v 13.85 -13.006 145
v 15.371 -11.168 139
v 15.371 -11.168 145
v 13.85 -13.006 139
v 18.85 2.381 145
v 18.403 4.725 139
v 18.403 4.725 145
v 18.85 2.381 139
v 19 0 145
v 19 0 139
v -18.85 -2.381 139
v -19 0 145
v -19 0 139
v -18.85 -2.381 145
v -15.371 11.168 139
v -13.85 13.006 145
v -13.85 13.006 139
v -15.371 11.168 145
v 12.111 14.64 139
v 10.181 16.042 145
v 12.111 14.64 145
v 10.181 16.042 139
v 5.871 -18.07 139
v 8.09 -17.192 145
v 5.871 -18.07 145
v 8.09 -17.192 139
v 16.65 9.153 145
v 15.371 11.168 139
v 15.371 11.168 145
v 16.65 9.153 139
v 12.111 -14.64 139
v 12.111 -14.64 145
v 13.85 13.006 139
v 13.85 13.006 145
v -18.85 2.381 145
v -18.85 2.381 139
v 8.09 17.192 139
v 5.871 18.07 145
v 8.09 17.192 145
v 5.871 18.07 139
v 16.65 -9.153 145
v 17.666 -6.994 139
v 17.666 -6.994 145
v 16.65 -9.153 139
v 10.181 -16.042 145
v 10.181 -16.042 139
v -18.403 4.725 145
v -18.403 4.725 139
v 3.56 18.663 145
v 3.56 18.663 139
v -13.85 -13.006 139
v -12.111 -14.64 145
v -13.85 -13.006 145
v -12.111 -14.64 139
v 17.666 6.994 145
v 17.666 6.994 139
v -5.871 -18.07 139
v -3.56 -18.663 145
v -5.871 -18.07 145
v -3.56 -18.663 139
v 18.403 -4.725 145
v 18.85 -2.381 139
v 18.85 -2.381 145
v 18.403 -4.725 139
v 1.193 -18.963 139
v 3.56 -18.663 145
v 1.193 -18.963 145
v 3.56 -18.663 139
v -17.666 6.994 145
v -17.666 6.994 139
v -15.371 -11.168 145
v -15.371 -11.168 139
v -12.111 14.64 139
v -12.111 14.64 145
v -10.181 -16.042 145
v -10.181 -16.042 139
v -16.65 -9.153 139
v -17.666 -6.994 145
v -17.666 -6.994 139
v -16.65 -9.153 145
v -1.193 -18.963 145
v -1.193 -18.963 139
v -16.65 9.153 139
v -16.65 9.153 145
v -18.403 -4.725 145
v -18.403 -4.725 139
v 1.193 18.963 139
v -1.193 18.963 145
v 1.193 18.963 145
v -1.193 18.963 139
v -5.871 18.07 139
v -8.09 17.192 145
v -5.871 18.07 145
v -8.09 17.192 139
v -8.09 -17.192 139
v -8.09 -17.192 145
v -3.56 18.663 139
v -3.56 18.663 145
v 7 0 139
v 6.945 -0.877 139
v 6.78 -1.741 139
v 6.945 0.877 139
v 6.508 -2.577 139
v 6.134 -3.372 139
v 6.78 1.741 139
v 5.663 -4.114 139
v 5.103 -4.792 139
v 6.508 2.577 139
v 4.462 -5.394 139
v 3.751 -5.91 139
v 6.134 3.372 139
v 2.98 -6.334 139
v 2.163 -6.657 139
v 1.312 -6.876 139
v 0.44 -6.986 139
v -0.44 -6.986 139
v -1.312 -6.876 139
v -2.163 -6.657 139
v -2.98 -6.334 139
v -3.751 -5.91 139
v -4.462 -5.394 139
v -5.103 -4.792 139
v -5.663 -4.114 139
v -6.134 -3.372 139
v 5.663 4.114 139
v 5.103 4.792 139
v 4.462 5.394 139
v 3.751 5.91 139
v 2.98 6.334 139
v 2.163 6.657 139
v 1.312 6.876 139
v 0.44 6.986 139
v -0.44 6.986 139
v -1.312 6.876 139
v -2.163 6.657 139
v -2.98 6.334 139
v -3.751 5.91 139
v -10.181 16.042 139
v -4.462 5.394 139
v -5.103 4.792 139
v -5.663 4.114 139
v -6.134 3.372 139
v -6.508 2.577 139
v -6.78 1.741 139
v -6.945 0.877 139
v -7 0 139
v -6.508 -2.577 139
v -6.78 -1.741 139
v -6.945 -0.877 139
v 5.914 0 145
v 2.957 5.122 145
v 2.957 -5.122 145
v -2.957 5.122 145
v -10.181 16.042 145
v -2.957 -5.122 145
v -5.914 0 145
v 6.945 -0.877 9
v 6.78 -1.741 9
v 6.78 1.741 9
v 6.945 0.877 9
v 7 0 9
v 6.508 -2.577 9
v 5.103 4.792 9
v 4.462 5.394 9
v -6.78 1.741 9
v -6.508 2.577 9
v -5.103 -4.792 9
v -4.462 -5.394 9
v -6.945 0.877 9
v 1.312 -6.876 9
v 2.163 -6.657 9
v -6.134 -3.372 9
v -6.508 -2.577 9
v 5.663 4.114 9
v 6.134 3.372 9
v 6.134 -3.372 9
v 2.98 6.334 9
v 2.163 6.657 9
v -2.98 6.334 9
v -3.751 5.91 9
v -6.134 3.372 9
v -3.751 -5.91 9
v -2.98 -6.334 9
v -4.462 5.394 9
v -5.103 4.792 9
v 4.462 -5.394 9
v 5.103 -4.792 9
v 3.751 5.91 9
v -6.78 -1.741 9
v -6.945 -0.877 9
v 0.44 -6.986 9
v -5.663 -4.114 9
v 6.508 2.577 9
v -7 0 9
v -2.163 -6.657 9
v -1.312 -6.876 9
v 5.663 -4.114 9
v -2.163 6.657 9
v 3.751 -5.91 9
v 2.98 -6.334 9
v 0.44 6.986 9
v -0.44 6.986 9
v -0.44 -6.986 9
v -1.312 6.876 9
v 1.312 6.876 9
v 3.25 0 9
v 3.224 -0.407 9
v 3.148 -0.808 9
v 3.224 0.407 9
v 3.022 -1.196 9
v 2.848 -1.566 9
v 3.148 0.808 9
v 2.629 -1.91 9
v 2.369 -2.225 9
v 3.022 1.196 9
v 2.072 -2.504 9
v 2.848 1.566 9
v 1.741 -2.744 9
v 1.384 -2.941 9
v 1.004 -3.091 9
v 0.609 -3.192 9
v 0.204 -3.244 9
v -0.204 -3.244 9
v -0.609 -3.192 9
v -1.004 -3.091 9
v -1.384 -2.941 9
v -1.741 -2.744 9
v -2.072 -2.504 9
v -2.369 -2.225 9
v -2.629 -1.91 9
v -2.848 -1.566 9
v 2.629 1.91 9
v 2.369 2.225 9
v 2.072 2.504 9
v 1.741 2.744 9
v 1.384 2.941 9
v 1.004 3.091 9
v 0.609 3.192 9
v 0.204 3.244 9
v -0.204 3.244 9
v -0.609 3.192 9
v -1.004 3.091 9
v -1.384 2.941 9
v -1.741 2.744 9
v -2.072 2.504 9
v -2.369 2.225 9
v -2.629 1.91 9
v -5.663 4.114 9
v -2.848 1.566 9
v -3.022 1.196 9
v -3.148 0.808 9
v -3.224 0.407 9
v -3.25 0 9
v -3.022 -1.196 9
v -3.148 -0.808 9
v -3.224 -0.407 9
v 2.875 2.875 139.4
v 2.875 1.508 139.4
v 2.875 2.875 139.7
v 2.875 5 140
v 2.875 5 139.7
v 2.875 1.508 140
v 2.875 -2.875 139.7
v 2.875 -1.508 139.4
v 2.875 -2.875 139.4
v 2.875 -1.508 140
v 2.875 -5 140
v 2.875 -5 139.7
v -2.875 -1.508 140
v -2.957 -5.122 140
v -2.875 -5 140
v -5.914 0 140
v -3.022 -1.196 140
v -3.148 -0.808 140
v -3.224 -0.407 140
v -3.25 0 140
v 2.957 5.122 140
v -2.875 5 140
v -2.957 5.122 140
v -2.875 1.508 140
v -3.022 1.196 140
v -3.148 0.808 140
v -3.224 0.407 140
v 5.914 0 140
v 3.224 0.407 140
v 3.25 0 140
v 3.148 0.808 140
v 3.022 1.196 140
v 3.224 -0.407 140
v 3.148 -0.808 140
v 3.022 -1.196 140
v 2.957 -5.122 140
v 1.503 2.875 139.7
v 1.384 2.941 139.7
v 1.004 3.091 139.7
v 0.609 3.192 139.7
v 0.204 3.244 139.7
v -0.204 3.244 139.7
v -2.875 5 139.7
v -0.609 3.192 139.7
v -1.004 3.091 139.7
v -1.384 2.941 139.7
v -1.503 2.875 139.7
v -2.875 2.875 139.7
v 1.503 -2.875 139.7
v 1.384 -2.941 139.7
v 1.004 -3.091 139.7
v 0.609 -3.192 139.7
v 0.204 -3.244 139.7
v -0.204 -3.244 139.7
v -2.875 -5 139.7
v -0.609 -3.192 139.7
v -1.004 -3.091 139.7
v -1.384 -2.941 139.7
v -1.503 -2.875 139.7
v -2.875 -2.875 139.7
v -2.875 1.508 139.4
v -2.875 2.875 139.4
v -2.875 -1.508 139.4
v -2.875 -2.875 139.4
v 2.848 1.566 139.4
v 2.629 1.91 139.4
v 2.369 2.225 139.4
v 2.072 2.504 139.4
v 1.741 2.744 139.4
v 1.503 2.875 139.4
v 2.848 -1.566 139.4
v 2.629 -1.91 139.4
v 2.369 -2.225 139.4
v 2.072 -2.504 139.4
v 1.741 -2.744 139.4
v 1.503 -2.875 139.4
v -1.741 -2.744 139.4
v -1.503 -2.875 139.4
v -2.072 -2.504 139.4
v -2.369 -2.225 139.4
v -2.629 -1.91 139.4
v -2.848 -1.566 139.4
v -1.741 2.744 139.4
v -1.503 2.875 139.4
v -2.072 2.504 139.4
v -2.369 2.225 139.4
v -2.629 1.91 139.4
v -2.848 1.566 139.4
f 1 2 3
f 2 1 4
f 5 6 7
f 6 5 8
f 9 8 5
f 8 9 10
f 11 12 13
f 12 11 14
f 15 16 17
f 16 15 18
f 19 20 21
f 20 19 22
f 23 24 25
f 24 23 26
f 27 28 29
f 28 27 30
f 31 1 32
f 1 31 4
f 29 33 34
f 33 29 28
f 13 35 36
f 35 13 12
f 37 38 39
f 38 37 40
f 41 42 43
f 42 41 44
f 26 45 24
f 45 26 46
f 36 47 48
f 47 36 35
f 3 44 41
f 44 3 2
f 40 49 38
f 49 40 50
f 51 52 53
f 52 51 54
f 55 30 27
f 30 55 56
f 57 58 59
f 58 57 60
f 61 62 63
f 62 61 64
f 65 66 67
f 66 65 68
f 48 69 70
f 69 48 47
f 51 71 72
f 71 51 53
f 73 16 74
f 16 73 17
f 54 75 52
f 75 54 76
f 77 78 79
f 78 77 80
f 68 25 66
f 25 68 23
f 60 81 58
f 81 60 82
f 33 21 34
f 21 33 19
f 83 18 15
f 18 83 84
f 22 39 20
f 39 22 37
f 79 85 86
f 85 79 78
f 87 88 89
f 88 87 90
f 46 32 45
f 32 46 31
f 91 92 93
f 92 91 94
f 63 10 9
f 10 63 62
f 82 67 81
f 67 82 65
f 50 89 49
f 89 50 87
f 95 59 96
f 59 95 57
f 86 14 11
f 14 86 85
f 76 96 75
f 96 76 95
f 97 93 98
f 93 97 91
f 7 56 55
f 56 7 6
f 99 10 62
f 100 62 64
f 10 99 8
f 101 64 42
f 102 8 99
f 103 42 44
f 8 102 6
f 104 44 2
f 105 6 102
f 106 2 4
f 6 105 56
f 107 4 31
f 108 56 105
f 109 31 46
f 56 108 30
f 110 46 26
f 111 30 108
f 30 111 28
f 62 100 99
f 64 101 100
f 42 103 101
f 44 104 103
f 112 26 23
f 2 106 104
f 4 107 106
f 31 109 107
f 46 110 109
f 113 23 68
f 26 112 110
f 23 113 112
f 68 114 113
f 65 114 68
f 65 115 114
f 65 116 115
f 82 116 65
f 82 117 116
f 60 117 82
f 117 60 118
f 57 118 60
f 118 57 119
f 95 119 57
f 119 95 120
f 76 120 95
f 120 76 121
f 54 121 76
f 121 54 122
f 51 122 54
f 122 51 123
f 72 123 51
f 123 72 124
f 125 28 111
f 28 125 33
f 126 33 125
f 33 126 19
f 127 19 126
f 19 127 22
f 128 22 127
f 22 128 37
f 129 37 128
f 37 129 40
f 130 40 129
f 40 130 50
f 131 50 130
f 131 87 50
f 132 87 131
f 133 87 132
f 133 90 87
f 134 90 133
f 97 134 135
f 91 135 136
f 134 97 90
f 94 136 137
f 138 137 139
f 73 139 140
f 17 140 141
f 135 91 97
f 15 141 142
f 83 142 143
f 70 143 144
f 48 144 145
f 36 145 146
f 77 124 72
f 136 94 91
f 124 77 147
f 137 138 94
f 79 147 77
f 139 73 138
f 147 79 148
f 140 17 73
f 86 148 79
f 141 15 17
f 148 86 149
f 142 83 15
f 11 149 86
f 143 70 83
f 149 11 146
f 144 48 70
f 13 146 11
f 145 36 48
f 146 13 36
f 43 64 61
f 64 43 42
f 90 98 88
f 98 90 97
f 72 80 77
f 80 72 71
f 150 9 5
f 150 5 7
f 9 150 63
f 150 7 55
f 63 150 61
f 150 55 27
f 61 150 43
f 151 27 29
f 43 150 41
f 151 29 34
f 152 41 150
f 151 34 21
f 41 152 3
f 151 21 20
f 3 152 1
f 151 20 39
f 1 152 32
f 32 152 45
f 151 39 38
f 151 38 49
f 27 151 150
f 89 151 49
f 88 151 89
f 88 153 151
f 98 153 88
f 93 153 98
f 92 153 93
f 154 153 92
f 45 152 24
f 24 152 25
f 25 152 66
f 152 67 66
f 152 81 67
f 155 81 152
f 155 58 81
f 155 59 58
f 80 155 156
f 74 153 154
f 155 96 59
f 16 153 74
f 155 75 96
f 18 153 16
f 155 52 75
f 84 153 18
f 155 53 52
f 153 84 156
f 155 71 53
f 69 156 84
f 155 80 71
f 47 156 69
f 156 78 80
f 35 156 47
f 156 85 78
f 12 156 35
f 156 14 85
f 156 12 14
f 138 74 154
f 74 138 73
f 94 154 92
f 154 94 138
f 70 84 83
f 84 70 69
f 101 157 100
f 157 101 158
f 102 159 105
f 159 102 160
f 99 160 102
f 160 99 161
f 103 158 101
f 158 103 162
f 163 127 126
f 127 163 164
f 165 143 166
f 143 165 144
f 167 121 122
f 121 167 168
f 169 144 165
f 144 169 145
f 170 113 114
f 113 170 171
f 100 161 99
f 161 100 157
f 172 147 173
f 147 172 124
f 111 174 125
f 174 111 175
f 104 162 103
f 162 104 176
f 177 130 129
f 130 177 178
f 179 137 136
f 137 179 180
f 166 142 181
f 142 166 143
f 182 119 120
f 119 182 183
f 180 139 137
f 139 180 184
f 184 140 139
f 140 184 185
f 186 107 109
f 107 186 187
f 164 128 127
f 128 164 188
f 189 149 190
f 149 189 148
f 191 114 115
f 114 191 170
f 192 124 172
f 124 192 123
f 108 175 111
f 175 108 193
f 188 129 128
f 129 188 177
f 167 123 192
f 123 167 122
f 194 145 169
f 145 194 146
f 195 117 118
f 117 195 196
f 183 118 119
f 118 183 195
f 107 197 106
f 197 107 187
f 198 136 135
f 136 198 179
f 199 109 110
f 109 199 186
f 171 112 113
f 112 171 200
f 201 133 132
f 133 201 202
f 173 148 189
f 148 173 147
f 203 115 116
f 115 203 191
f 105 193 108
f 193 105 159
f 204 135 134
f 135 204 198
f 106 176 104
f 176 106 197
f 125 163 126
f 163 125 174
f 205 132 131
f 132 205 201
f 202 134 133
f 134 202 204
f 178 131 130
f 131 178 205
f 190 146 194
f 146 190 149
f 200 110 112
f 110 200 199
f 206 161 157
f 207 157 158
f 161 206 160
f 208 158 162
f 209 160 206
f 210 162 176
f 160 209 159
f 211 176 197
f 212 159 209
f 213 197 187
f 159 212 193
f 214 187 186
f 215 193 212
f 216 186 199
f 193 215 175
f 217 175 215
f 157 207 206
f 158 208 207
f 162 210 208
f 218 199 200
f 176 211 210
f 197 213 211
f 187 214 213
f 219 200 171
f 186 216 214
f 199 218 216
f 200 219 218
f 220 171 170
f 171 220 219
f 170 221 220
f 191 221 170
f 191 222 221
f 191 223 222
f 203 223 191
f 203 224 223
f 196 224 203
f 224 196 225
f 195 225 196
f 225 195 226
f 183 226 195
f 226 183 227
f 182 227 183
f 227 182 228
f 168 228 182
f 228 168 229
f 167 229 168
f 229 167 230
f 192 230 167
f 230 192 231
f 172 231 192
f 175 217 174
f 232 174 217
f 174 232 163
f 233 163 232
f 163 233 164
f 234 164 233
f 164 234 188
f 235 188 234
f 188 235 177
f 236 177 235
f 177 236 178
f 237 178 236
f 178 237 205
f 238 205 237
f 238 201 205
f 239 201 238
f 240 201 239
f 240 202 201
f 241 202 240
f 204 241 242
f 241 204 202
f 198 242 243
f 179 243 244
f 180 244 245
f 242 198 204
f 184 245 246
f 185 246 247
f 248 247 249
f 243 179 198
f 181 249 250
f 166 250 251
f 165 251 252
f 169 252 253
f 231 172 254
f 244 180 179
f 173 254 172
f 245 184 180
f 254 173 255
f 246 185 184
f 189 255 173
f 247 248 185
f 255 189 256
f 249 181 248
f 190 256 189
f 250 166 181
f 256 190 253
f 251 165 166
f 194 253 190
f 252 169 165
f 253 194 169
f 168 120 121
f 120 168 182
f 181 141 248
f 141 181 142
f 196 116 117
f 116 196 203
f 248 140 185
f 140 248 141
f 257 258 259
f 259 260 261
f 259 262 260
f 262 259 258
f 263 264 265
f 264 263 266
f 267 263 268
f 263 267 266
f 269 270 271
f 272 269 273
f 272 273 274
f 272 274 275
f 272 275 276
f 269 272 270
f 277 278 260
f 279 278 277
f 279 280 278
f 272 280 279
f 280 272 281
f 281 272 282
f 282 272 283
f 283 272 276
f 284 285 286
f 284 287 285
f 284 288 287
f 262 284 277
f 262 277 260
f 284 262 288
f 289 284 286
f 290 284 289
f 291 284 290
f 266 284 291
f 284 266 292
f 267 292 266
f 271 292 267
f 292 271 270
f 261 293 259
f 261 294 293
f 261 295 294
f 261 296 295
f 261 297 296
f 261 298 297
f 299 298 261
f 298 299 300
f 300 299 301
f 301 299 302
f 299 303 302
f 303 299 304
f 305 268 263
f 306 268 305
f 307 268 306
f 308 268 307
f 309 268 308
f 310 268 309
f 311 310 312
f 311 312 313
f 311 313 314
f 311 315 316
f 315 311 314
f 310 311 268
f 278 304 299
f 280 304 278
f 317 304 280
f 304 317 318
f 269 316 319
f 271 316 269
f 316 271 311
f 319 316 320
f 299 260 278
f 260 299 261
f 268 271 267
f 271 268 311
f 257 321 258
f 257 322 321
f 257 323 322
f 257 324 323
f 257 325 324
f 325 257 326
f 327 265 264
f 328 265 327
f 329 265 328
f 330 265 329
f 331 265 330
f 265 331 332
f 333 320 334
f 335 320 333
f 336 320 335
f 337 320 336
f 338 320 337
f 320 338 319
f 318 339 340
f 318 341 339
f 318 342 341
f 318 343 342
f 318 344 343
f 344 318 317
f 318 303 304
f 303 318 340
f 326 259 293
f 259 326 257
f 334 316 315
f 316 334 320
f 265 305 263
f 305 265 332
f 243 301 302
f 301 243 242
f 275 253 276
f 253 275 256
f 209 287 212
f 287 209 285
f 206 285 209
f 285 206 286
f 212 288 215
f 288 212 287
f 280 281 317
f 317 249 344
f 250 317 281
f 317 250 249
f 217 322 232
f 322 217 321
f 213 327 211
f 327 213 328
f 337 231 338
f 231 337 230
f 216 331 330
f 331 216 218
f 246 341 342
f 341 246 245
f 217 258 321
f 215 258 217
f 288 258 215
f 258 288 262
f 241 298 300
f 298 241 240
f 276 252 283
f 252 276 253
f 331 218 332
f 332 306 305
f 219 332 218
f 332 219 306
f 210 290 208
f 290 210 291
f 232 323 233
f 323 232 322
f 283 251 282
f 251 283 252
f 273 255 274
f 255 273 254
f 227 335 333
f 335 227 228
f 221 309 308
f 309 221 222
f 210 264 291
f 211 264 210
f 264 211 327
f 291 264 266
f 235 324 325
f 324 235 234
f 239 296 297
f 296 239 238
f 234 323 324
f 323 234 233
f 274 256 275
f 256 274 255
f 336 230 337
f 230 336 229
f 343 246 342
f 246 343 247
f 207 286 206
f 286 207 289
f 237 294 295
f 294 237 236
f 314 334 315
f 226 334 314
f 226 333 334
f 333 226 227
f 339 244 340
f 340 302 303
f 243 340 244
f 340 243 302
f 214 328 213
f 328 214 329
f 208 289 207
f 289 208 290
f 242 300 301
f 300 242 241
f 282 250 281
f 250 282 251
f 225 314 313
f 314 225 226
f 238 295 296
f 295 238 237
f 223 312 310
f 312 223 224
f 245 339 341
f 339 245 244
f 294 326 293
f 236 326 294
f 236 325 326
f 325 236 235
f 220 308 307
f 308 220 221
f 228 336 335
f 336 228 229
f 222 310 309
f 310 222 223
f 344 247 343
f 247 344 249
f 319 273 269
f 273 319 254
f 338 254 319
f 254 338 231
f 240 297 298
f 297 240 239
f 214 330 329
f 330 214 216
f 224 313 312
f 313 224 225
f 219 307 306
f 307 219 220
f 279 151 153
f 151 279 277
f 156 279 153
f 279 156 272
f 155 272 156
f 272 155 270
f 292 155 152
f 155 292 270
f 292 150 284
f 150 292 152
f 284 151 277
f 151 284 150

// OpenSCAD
$fn = 50;


difference() {
	union() {
		translate(v = [0, 0, 139.0000000000]) {
			cylinder(h = 6, r = 19.0000000000);
		}
		translate(v = [0, 0, 9.0000000000]) {
			cylinder(h = 136, r = 7.0000000000);
		}
	}
	union() {
		translate(v = [0, 0, 145]) {
			rotate(a = [0, 0, 0]) {
				difference() {
					union() {
						#translate(v = [-2.8750000000, -5.0000000000, -5.3000000000]) {
							cube(size = [5.7500000000, 10, 0.3000000000]);
						}
						#translate(v = [-2.8750000000, -2.8750000000, -5.6000000000]) {
							cube(size = [5.7500000000, 5.7500000000, 0.3000000000]);
						}
						#translate(v = [-2.8750000000, -5.0000000000, 0]) {
							cube(size = [5.7500000000, 10, 0.3000000000]);
						}
						#translate(v = [-2.8750000000, -2.8750000000, 0.3000000000]) {
							cube(size = [5.7500000000, 5.7500000000, 0.3000000000]);
						}
						#translate(v = [0, 0, -100.0000000000]) {
							cylinder(h = 200, r = 3.2500000000);
						}
						translate(v = [0, 0, -5]) {
							#linear_extrude(height = 5) {
								polygon(points = [[5.9142500000, 0.0000000000], [2.9571250000, 5.1218907443], [-2.9571250000, 5.1218907443], [-5.9142500000, 0.0000000000], [-2.9571250000, -5.1218907443], [2.9571250000, -5.1218907443]]);
							}
						}
						#translate(v = [-2.8750000000, -5.0000000000, -5.3000000000]) {
							cube(size = [5.7500000000, 10, 0.3000000000]);
						}
						#translate(v = [-2.8750000000, -2.8750000000, -5.6000000000]) {
							cube(size = [5.7500000000, 5.7500000000, 0.3000000000]);
						}
						#translate(v = [-2.8750000000, -5.0000000000, 0]) {
							cube(size = [5.7500000000, 10, 0.3000000000]);
						}
						#translate(v = [-2.8750000000, -2.8750000000, 0.3000000000]) {
							cube(size = [5.7500000000, 5.7500000000, 0.3000000000]);
						}
						#translate(v = [0, 0, -100.0000000000]) {
							cylinder(h = 200, r = 3.2500000000);
						}
						#translate(v = [-2.8750000000, -5.0000000000, -5.3000000000]) {
							cube(size = [5.7500000000, 10, 0.3000000000]);
						}
						#translate(v = [-2.8750000000, -2.8750000000, -5.6000000000]) {
							cube(size = [5.7500000000, 5.7500000000, 0.3000000000]);
						}
						#translate(v = [-2.8750000000, -5.0000000000, 0]) {
							cube(size = [5.7500000000, 10, 0.3000000000]);
						}
						#translate(v = [-2.8750000000, -2.8750000000, 0.3000000000]) {
							cube(size = [5.7500000000, 5.7500000000, 0.3000000000]);
						}
						#translate(v = [0, 0, -100.0000000000]) {
							cylinder(h = 200, r = 3.2500000000);
						}
					}
					union();
				}
			}
		}
		#translate(v = [0, 0, -100.0000000000]) {
			cylinder(h = 200, r = 3.2500000000);
		}
	}
}
